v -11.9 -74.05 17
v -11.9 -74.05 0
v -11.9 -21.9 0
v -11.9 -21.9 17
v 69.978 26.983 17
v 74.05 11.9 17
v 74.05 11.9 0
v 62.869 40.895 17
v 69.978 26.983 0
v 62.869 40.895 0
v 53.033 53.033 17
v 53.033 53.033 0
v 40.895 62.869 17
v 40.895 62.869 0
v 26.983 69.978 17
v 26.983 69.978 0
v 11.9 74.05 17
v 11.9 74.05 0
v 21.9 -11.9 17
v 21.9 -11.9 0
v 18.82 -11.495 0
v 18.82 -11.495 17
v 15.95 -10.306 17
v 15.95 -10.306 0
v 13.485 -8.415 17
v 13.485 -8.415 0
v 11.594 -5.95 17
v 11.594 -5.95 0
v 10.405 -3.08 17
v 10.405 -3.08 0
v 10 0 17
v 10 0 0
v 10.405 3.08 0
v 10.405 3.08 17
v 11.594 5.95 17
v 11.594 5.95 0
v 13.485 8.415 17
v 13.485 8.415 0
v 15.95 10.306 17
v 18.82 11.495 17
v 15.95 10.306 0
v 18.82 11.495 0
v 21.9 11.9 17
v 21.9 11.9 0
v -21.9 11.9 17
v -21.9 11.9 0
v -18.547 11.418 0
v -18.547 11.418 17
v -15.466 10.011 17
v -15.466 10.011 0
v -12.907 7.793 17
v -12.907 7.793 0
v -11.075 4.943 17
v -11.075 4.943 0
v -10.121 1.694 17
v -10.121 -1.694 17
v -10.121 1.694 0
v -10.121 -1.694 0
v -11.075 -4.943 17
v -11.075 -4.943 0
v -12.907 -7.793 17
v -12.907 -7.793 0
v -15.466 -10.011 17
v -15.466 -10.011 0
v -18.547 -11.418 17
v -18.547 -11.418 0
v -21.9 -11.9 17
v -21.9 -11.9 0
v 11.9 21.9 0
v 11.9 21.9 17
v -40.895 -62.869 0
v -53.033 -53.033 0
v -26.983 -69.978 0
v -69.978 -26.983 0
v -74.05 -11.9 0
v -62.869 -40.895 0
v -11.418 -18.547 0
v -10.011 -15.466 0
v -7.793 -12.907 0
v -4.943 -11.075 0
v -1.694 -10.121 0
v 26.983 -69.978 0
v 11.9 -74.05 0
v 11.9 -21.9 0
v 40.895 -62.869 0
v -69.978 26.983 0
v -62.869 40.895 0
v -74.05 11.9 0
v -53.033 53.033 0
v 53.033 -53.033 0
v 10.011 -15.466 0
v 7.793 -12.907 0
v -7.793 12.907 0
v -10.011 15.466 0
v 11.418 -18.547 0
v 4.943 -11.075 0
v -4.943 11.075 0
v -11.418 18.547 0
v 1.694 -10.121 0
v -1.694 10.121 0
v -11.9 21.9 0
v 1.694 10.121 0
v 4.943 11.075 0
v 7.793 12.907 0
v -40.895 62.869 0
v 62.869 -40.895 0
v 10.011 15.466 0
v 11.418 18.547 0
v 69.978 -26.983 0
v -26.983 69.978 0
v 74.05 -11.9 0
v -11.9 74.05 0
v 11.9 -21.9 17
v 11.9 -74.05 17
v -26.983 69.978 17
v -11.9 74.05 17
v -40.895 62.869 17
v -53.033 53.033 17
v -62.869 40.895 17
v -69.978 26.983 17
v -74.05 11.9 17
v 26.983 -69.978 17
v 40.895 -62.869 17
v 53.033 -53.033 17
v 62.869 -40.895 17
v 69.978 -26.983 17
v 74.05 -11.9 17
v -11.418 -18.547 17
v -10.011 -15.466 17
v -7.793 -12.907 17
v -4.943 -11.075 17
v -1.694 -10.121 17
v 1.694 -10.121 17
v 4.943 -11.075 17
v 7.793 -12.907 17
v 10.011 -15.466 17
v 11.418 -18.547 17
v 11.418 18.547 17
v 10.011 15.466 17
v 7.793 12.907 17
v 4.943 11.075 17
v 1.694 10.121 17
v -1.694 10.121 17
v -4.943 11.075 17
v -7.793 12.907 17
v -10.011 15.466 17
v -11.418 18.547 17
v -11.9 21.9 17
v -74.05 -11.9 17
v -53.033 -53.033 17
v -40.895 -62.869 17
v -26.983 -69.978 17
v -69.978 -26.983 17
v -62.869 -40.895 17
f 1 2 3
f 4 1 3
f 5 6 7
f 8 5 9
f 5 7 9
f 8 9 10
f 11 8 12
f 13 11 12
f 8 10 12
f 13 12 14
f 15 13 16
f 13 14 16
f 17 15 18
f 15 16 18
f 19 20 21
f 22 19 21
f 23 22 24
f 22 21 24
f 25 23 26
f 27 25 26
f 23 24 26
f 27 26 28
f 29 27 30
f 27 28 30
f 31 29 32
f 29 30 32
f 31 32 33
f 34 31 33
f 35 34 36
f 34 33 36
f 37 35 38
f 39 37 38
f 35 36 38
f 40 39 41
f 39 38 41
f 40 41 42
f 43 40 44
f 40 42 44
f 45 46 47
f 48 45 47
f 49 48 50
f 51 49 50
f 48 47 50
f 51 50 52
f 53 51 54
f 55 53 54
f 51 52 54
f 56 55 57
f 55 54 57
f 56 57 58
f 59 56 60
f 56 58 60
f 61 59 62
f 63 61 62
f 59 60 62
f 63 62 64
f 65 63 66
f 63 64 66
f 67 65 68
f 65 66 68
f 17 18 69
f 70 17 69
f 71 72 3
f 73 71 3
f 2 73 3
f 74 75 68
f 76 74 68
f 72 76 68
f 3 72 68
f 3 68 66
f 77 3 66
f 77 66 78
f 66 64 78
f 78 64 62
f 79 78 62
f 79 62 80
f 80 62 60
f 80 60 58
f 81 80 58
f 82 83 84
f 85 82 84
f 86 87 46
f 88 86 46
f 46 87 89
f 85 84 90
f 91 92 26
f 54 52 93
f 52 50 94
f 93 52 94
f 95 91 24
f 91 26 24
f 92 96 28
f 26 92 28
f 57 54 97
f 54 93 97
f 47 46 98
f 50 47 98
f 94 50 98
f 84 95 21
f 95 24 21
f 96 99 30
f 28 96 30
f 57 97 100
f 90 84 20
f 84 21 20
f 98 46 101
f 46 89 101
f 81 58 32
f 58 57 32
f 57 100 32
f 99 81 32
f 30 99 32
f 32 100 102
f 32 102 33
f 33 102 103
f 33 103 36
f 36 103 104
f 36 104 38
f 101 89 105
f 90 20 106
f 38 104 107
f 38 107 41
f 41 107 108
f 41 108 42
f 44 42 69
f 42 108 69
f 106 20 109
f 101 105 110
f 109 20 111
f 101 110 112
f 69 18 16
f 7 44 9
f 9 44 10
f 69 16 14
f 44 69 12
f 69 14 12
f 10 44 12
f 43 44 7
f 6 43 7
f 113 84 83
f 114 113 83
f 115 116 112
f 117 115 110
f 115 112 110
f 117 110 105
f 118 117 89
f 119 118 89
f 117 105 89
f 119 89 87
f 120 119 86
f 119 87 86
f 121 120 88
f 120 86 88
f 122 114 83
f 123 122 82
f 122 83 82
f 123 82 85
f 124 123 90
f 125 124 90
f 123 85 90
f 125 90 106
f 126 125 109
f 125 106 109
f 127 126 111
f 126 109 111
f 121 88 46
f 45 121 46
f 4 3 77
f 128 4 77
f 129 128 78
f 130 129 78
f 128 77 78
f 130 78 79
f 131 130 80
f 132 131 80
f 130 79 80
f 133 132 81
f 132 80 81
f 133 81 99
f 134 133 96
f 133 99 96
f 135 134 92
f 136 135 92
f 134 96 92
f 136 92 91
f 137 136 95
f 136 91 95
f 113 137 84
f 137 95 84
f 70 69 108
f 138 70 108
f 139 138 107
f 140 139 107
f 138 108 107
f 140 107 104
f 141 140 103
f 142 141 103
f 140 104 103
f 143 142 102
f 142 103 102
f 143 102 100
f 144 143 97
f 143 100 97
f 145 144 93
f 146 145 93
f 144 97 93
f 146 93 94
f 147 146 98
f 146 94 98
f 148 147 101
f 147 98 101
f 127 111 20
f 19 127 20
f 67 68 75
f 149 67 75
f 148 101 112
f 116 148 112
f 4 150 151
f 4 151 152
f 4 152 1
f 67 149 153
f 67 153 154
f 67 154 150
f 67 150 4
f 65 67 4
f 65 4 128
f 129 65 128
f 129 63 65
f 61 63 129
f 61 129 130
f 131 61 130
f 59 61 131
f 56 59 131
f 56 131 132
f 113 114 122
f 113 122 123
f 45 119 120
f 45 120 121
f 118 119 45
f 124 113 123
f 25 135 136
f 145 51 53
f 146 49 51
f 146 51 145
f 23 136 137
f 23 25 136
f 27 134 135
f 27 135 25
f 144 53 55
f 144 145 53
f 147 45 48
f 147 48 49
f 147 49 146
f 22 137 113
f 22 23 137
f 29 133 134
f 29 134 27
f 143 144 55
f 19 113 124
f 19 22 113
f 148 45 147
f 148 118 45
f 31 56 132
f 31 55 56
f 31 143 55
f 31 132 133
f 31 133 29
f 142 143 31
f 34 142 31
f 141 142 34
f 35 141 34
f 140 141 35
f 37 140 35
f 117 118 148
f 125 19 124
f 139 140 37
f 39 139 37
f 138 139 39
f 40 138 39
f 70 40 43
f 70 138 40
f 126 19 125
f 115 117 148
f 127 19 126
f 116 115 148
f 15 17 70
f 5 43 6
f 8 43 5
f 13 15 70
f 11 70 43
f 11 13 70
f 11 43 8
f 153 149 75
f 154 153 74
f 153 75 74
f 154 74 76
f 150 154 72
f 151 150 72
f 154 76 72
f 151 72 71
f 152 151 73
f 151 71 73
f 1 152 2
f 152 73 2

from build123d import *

# Parameters (mm, degrees)
F1_DEPTH = 17


# Not quite as in the source:
# - a feature of the source that left no trace in its solid (it failed there, or was rolled back) is left out


with BuildPart() as f1:
    # F0 (on Top) → F1 (new body)
    with BuildSketch(Plane.XY):
        with BuildLine():
            Line((21.9, 11.9), (74.0499155975, 11.9))
            ThreePointArc((74.0499155975, 11.9), (53.033008589, 53.033008589), (11.9, 74.0499155975))
            Line((11.9, 74.0499155975), (11.9, 21.9))
            ThreePointArc((11.9, 21.9), (0, 10), (-11.9, 21.9))
            Line((-11.9, 21.9), (-11.9, 74.0499155975))
            ThreePointArc((-11.9, 74.0499155975), (-53.033008589, 53.033008589), (-74.0499155975, 11.9))
            Line((-74.0499155975, 11.9), (-21.9, 11.9))
            ThreePointArc((-21.9, 11.9), (-10, 0), (-21.9, -11.9))
            Line((-21.9, -11.9), (-74.0499155975, -11.9))
            ThreePointArc((-74.0499155975, -11.9), (-53.033008589, -53.033008589), (-11.9, -74.0499155975))
            Line((-11.9, -74.0499155975), (-11.9, -21.9))
            ThreePointArc((-11.9, -21.9), (0, -10), (11.9, -21.9))
            Line((11.9, -21.9), (11.9, -74.0499155975))
            ThreePointArc((11.9, -74.0499155975), (53.033008589, -53.033008589), (74.0499155975, -11.9))
            Line((74.0499155975, -11.9), (21.9, -11.9))
            ThreePointArc((21.9, -11.9), (13.4854293039, -8.4145706961), (10, 0))
            ThreePointArc((10, 0), (13.4854293039, 8.4145706961), (21.9, 11.9))
        make_face()
    extrude(amount=F1_DEPTH)


solid = f1.part
